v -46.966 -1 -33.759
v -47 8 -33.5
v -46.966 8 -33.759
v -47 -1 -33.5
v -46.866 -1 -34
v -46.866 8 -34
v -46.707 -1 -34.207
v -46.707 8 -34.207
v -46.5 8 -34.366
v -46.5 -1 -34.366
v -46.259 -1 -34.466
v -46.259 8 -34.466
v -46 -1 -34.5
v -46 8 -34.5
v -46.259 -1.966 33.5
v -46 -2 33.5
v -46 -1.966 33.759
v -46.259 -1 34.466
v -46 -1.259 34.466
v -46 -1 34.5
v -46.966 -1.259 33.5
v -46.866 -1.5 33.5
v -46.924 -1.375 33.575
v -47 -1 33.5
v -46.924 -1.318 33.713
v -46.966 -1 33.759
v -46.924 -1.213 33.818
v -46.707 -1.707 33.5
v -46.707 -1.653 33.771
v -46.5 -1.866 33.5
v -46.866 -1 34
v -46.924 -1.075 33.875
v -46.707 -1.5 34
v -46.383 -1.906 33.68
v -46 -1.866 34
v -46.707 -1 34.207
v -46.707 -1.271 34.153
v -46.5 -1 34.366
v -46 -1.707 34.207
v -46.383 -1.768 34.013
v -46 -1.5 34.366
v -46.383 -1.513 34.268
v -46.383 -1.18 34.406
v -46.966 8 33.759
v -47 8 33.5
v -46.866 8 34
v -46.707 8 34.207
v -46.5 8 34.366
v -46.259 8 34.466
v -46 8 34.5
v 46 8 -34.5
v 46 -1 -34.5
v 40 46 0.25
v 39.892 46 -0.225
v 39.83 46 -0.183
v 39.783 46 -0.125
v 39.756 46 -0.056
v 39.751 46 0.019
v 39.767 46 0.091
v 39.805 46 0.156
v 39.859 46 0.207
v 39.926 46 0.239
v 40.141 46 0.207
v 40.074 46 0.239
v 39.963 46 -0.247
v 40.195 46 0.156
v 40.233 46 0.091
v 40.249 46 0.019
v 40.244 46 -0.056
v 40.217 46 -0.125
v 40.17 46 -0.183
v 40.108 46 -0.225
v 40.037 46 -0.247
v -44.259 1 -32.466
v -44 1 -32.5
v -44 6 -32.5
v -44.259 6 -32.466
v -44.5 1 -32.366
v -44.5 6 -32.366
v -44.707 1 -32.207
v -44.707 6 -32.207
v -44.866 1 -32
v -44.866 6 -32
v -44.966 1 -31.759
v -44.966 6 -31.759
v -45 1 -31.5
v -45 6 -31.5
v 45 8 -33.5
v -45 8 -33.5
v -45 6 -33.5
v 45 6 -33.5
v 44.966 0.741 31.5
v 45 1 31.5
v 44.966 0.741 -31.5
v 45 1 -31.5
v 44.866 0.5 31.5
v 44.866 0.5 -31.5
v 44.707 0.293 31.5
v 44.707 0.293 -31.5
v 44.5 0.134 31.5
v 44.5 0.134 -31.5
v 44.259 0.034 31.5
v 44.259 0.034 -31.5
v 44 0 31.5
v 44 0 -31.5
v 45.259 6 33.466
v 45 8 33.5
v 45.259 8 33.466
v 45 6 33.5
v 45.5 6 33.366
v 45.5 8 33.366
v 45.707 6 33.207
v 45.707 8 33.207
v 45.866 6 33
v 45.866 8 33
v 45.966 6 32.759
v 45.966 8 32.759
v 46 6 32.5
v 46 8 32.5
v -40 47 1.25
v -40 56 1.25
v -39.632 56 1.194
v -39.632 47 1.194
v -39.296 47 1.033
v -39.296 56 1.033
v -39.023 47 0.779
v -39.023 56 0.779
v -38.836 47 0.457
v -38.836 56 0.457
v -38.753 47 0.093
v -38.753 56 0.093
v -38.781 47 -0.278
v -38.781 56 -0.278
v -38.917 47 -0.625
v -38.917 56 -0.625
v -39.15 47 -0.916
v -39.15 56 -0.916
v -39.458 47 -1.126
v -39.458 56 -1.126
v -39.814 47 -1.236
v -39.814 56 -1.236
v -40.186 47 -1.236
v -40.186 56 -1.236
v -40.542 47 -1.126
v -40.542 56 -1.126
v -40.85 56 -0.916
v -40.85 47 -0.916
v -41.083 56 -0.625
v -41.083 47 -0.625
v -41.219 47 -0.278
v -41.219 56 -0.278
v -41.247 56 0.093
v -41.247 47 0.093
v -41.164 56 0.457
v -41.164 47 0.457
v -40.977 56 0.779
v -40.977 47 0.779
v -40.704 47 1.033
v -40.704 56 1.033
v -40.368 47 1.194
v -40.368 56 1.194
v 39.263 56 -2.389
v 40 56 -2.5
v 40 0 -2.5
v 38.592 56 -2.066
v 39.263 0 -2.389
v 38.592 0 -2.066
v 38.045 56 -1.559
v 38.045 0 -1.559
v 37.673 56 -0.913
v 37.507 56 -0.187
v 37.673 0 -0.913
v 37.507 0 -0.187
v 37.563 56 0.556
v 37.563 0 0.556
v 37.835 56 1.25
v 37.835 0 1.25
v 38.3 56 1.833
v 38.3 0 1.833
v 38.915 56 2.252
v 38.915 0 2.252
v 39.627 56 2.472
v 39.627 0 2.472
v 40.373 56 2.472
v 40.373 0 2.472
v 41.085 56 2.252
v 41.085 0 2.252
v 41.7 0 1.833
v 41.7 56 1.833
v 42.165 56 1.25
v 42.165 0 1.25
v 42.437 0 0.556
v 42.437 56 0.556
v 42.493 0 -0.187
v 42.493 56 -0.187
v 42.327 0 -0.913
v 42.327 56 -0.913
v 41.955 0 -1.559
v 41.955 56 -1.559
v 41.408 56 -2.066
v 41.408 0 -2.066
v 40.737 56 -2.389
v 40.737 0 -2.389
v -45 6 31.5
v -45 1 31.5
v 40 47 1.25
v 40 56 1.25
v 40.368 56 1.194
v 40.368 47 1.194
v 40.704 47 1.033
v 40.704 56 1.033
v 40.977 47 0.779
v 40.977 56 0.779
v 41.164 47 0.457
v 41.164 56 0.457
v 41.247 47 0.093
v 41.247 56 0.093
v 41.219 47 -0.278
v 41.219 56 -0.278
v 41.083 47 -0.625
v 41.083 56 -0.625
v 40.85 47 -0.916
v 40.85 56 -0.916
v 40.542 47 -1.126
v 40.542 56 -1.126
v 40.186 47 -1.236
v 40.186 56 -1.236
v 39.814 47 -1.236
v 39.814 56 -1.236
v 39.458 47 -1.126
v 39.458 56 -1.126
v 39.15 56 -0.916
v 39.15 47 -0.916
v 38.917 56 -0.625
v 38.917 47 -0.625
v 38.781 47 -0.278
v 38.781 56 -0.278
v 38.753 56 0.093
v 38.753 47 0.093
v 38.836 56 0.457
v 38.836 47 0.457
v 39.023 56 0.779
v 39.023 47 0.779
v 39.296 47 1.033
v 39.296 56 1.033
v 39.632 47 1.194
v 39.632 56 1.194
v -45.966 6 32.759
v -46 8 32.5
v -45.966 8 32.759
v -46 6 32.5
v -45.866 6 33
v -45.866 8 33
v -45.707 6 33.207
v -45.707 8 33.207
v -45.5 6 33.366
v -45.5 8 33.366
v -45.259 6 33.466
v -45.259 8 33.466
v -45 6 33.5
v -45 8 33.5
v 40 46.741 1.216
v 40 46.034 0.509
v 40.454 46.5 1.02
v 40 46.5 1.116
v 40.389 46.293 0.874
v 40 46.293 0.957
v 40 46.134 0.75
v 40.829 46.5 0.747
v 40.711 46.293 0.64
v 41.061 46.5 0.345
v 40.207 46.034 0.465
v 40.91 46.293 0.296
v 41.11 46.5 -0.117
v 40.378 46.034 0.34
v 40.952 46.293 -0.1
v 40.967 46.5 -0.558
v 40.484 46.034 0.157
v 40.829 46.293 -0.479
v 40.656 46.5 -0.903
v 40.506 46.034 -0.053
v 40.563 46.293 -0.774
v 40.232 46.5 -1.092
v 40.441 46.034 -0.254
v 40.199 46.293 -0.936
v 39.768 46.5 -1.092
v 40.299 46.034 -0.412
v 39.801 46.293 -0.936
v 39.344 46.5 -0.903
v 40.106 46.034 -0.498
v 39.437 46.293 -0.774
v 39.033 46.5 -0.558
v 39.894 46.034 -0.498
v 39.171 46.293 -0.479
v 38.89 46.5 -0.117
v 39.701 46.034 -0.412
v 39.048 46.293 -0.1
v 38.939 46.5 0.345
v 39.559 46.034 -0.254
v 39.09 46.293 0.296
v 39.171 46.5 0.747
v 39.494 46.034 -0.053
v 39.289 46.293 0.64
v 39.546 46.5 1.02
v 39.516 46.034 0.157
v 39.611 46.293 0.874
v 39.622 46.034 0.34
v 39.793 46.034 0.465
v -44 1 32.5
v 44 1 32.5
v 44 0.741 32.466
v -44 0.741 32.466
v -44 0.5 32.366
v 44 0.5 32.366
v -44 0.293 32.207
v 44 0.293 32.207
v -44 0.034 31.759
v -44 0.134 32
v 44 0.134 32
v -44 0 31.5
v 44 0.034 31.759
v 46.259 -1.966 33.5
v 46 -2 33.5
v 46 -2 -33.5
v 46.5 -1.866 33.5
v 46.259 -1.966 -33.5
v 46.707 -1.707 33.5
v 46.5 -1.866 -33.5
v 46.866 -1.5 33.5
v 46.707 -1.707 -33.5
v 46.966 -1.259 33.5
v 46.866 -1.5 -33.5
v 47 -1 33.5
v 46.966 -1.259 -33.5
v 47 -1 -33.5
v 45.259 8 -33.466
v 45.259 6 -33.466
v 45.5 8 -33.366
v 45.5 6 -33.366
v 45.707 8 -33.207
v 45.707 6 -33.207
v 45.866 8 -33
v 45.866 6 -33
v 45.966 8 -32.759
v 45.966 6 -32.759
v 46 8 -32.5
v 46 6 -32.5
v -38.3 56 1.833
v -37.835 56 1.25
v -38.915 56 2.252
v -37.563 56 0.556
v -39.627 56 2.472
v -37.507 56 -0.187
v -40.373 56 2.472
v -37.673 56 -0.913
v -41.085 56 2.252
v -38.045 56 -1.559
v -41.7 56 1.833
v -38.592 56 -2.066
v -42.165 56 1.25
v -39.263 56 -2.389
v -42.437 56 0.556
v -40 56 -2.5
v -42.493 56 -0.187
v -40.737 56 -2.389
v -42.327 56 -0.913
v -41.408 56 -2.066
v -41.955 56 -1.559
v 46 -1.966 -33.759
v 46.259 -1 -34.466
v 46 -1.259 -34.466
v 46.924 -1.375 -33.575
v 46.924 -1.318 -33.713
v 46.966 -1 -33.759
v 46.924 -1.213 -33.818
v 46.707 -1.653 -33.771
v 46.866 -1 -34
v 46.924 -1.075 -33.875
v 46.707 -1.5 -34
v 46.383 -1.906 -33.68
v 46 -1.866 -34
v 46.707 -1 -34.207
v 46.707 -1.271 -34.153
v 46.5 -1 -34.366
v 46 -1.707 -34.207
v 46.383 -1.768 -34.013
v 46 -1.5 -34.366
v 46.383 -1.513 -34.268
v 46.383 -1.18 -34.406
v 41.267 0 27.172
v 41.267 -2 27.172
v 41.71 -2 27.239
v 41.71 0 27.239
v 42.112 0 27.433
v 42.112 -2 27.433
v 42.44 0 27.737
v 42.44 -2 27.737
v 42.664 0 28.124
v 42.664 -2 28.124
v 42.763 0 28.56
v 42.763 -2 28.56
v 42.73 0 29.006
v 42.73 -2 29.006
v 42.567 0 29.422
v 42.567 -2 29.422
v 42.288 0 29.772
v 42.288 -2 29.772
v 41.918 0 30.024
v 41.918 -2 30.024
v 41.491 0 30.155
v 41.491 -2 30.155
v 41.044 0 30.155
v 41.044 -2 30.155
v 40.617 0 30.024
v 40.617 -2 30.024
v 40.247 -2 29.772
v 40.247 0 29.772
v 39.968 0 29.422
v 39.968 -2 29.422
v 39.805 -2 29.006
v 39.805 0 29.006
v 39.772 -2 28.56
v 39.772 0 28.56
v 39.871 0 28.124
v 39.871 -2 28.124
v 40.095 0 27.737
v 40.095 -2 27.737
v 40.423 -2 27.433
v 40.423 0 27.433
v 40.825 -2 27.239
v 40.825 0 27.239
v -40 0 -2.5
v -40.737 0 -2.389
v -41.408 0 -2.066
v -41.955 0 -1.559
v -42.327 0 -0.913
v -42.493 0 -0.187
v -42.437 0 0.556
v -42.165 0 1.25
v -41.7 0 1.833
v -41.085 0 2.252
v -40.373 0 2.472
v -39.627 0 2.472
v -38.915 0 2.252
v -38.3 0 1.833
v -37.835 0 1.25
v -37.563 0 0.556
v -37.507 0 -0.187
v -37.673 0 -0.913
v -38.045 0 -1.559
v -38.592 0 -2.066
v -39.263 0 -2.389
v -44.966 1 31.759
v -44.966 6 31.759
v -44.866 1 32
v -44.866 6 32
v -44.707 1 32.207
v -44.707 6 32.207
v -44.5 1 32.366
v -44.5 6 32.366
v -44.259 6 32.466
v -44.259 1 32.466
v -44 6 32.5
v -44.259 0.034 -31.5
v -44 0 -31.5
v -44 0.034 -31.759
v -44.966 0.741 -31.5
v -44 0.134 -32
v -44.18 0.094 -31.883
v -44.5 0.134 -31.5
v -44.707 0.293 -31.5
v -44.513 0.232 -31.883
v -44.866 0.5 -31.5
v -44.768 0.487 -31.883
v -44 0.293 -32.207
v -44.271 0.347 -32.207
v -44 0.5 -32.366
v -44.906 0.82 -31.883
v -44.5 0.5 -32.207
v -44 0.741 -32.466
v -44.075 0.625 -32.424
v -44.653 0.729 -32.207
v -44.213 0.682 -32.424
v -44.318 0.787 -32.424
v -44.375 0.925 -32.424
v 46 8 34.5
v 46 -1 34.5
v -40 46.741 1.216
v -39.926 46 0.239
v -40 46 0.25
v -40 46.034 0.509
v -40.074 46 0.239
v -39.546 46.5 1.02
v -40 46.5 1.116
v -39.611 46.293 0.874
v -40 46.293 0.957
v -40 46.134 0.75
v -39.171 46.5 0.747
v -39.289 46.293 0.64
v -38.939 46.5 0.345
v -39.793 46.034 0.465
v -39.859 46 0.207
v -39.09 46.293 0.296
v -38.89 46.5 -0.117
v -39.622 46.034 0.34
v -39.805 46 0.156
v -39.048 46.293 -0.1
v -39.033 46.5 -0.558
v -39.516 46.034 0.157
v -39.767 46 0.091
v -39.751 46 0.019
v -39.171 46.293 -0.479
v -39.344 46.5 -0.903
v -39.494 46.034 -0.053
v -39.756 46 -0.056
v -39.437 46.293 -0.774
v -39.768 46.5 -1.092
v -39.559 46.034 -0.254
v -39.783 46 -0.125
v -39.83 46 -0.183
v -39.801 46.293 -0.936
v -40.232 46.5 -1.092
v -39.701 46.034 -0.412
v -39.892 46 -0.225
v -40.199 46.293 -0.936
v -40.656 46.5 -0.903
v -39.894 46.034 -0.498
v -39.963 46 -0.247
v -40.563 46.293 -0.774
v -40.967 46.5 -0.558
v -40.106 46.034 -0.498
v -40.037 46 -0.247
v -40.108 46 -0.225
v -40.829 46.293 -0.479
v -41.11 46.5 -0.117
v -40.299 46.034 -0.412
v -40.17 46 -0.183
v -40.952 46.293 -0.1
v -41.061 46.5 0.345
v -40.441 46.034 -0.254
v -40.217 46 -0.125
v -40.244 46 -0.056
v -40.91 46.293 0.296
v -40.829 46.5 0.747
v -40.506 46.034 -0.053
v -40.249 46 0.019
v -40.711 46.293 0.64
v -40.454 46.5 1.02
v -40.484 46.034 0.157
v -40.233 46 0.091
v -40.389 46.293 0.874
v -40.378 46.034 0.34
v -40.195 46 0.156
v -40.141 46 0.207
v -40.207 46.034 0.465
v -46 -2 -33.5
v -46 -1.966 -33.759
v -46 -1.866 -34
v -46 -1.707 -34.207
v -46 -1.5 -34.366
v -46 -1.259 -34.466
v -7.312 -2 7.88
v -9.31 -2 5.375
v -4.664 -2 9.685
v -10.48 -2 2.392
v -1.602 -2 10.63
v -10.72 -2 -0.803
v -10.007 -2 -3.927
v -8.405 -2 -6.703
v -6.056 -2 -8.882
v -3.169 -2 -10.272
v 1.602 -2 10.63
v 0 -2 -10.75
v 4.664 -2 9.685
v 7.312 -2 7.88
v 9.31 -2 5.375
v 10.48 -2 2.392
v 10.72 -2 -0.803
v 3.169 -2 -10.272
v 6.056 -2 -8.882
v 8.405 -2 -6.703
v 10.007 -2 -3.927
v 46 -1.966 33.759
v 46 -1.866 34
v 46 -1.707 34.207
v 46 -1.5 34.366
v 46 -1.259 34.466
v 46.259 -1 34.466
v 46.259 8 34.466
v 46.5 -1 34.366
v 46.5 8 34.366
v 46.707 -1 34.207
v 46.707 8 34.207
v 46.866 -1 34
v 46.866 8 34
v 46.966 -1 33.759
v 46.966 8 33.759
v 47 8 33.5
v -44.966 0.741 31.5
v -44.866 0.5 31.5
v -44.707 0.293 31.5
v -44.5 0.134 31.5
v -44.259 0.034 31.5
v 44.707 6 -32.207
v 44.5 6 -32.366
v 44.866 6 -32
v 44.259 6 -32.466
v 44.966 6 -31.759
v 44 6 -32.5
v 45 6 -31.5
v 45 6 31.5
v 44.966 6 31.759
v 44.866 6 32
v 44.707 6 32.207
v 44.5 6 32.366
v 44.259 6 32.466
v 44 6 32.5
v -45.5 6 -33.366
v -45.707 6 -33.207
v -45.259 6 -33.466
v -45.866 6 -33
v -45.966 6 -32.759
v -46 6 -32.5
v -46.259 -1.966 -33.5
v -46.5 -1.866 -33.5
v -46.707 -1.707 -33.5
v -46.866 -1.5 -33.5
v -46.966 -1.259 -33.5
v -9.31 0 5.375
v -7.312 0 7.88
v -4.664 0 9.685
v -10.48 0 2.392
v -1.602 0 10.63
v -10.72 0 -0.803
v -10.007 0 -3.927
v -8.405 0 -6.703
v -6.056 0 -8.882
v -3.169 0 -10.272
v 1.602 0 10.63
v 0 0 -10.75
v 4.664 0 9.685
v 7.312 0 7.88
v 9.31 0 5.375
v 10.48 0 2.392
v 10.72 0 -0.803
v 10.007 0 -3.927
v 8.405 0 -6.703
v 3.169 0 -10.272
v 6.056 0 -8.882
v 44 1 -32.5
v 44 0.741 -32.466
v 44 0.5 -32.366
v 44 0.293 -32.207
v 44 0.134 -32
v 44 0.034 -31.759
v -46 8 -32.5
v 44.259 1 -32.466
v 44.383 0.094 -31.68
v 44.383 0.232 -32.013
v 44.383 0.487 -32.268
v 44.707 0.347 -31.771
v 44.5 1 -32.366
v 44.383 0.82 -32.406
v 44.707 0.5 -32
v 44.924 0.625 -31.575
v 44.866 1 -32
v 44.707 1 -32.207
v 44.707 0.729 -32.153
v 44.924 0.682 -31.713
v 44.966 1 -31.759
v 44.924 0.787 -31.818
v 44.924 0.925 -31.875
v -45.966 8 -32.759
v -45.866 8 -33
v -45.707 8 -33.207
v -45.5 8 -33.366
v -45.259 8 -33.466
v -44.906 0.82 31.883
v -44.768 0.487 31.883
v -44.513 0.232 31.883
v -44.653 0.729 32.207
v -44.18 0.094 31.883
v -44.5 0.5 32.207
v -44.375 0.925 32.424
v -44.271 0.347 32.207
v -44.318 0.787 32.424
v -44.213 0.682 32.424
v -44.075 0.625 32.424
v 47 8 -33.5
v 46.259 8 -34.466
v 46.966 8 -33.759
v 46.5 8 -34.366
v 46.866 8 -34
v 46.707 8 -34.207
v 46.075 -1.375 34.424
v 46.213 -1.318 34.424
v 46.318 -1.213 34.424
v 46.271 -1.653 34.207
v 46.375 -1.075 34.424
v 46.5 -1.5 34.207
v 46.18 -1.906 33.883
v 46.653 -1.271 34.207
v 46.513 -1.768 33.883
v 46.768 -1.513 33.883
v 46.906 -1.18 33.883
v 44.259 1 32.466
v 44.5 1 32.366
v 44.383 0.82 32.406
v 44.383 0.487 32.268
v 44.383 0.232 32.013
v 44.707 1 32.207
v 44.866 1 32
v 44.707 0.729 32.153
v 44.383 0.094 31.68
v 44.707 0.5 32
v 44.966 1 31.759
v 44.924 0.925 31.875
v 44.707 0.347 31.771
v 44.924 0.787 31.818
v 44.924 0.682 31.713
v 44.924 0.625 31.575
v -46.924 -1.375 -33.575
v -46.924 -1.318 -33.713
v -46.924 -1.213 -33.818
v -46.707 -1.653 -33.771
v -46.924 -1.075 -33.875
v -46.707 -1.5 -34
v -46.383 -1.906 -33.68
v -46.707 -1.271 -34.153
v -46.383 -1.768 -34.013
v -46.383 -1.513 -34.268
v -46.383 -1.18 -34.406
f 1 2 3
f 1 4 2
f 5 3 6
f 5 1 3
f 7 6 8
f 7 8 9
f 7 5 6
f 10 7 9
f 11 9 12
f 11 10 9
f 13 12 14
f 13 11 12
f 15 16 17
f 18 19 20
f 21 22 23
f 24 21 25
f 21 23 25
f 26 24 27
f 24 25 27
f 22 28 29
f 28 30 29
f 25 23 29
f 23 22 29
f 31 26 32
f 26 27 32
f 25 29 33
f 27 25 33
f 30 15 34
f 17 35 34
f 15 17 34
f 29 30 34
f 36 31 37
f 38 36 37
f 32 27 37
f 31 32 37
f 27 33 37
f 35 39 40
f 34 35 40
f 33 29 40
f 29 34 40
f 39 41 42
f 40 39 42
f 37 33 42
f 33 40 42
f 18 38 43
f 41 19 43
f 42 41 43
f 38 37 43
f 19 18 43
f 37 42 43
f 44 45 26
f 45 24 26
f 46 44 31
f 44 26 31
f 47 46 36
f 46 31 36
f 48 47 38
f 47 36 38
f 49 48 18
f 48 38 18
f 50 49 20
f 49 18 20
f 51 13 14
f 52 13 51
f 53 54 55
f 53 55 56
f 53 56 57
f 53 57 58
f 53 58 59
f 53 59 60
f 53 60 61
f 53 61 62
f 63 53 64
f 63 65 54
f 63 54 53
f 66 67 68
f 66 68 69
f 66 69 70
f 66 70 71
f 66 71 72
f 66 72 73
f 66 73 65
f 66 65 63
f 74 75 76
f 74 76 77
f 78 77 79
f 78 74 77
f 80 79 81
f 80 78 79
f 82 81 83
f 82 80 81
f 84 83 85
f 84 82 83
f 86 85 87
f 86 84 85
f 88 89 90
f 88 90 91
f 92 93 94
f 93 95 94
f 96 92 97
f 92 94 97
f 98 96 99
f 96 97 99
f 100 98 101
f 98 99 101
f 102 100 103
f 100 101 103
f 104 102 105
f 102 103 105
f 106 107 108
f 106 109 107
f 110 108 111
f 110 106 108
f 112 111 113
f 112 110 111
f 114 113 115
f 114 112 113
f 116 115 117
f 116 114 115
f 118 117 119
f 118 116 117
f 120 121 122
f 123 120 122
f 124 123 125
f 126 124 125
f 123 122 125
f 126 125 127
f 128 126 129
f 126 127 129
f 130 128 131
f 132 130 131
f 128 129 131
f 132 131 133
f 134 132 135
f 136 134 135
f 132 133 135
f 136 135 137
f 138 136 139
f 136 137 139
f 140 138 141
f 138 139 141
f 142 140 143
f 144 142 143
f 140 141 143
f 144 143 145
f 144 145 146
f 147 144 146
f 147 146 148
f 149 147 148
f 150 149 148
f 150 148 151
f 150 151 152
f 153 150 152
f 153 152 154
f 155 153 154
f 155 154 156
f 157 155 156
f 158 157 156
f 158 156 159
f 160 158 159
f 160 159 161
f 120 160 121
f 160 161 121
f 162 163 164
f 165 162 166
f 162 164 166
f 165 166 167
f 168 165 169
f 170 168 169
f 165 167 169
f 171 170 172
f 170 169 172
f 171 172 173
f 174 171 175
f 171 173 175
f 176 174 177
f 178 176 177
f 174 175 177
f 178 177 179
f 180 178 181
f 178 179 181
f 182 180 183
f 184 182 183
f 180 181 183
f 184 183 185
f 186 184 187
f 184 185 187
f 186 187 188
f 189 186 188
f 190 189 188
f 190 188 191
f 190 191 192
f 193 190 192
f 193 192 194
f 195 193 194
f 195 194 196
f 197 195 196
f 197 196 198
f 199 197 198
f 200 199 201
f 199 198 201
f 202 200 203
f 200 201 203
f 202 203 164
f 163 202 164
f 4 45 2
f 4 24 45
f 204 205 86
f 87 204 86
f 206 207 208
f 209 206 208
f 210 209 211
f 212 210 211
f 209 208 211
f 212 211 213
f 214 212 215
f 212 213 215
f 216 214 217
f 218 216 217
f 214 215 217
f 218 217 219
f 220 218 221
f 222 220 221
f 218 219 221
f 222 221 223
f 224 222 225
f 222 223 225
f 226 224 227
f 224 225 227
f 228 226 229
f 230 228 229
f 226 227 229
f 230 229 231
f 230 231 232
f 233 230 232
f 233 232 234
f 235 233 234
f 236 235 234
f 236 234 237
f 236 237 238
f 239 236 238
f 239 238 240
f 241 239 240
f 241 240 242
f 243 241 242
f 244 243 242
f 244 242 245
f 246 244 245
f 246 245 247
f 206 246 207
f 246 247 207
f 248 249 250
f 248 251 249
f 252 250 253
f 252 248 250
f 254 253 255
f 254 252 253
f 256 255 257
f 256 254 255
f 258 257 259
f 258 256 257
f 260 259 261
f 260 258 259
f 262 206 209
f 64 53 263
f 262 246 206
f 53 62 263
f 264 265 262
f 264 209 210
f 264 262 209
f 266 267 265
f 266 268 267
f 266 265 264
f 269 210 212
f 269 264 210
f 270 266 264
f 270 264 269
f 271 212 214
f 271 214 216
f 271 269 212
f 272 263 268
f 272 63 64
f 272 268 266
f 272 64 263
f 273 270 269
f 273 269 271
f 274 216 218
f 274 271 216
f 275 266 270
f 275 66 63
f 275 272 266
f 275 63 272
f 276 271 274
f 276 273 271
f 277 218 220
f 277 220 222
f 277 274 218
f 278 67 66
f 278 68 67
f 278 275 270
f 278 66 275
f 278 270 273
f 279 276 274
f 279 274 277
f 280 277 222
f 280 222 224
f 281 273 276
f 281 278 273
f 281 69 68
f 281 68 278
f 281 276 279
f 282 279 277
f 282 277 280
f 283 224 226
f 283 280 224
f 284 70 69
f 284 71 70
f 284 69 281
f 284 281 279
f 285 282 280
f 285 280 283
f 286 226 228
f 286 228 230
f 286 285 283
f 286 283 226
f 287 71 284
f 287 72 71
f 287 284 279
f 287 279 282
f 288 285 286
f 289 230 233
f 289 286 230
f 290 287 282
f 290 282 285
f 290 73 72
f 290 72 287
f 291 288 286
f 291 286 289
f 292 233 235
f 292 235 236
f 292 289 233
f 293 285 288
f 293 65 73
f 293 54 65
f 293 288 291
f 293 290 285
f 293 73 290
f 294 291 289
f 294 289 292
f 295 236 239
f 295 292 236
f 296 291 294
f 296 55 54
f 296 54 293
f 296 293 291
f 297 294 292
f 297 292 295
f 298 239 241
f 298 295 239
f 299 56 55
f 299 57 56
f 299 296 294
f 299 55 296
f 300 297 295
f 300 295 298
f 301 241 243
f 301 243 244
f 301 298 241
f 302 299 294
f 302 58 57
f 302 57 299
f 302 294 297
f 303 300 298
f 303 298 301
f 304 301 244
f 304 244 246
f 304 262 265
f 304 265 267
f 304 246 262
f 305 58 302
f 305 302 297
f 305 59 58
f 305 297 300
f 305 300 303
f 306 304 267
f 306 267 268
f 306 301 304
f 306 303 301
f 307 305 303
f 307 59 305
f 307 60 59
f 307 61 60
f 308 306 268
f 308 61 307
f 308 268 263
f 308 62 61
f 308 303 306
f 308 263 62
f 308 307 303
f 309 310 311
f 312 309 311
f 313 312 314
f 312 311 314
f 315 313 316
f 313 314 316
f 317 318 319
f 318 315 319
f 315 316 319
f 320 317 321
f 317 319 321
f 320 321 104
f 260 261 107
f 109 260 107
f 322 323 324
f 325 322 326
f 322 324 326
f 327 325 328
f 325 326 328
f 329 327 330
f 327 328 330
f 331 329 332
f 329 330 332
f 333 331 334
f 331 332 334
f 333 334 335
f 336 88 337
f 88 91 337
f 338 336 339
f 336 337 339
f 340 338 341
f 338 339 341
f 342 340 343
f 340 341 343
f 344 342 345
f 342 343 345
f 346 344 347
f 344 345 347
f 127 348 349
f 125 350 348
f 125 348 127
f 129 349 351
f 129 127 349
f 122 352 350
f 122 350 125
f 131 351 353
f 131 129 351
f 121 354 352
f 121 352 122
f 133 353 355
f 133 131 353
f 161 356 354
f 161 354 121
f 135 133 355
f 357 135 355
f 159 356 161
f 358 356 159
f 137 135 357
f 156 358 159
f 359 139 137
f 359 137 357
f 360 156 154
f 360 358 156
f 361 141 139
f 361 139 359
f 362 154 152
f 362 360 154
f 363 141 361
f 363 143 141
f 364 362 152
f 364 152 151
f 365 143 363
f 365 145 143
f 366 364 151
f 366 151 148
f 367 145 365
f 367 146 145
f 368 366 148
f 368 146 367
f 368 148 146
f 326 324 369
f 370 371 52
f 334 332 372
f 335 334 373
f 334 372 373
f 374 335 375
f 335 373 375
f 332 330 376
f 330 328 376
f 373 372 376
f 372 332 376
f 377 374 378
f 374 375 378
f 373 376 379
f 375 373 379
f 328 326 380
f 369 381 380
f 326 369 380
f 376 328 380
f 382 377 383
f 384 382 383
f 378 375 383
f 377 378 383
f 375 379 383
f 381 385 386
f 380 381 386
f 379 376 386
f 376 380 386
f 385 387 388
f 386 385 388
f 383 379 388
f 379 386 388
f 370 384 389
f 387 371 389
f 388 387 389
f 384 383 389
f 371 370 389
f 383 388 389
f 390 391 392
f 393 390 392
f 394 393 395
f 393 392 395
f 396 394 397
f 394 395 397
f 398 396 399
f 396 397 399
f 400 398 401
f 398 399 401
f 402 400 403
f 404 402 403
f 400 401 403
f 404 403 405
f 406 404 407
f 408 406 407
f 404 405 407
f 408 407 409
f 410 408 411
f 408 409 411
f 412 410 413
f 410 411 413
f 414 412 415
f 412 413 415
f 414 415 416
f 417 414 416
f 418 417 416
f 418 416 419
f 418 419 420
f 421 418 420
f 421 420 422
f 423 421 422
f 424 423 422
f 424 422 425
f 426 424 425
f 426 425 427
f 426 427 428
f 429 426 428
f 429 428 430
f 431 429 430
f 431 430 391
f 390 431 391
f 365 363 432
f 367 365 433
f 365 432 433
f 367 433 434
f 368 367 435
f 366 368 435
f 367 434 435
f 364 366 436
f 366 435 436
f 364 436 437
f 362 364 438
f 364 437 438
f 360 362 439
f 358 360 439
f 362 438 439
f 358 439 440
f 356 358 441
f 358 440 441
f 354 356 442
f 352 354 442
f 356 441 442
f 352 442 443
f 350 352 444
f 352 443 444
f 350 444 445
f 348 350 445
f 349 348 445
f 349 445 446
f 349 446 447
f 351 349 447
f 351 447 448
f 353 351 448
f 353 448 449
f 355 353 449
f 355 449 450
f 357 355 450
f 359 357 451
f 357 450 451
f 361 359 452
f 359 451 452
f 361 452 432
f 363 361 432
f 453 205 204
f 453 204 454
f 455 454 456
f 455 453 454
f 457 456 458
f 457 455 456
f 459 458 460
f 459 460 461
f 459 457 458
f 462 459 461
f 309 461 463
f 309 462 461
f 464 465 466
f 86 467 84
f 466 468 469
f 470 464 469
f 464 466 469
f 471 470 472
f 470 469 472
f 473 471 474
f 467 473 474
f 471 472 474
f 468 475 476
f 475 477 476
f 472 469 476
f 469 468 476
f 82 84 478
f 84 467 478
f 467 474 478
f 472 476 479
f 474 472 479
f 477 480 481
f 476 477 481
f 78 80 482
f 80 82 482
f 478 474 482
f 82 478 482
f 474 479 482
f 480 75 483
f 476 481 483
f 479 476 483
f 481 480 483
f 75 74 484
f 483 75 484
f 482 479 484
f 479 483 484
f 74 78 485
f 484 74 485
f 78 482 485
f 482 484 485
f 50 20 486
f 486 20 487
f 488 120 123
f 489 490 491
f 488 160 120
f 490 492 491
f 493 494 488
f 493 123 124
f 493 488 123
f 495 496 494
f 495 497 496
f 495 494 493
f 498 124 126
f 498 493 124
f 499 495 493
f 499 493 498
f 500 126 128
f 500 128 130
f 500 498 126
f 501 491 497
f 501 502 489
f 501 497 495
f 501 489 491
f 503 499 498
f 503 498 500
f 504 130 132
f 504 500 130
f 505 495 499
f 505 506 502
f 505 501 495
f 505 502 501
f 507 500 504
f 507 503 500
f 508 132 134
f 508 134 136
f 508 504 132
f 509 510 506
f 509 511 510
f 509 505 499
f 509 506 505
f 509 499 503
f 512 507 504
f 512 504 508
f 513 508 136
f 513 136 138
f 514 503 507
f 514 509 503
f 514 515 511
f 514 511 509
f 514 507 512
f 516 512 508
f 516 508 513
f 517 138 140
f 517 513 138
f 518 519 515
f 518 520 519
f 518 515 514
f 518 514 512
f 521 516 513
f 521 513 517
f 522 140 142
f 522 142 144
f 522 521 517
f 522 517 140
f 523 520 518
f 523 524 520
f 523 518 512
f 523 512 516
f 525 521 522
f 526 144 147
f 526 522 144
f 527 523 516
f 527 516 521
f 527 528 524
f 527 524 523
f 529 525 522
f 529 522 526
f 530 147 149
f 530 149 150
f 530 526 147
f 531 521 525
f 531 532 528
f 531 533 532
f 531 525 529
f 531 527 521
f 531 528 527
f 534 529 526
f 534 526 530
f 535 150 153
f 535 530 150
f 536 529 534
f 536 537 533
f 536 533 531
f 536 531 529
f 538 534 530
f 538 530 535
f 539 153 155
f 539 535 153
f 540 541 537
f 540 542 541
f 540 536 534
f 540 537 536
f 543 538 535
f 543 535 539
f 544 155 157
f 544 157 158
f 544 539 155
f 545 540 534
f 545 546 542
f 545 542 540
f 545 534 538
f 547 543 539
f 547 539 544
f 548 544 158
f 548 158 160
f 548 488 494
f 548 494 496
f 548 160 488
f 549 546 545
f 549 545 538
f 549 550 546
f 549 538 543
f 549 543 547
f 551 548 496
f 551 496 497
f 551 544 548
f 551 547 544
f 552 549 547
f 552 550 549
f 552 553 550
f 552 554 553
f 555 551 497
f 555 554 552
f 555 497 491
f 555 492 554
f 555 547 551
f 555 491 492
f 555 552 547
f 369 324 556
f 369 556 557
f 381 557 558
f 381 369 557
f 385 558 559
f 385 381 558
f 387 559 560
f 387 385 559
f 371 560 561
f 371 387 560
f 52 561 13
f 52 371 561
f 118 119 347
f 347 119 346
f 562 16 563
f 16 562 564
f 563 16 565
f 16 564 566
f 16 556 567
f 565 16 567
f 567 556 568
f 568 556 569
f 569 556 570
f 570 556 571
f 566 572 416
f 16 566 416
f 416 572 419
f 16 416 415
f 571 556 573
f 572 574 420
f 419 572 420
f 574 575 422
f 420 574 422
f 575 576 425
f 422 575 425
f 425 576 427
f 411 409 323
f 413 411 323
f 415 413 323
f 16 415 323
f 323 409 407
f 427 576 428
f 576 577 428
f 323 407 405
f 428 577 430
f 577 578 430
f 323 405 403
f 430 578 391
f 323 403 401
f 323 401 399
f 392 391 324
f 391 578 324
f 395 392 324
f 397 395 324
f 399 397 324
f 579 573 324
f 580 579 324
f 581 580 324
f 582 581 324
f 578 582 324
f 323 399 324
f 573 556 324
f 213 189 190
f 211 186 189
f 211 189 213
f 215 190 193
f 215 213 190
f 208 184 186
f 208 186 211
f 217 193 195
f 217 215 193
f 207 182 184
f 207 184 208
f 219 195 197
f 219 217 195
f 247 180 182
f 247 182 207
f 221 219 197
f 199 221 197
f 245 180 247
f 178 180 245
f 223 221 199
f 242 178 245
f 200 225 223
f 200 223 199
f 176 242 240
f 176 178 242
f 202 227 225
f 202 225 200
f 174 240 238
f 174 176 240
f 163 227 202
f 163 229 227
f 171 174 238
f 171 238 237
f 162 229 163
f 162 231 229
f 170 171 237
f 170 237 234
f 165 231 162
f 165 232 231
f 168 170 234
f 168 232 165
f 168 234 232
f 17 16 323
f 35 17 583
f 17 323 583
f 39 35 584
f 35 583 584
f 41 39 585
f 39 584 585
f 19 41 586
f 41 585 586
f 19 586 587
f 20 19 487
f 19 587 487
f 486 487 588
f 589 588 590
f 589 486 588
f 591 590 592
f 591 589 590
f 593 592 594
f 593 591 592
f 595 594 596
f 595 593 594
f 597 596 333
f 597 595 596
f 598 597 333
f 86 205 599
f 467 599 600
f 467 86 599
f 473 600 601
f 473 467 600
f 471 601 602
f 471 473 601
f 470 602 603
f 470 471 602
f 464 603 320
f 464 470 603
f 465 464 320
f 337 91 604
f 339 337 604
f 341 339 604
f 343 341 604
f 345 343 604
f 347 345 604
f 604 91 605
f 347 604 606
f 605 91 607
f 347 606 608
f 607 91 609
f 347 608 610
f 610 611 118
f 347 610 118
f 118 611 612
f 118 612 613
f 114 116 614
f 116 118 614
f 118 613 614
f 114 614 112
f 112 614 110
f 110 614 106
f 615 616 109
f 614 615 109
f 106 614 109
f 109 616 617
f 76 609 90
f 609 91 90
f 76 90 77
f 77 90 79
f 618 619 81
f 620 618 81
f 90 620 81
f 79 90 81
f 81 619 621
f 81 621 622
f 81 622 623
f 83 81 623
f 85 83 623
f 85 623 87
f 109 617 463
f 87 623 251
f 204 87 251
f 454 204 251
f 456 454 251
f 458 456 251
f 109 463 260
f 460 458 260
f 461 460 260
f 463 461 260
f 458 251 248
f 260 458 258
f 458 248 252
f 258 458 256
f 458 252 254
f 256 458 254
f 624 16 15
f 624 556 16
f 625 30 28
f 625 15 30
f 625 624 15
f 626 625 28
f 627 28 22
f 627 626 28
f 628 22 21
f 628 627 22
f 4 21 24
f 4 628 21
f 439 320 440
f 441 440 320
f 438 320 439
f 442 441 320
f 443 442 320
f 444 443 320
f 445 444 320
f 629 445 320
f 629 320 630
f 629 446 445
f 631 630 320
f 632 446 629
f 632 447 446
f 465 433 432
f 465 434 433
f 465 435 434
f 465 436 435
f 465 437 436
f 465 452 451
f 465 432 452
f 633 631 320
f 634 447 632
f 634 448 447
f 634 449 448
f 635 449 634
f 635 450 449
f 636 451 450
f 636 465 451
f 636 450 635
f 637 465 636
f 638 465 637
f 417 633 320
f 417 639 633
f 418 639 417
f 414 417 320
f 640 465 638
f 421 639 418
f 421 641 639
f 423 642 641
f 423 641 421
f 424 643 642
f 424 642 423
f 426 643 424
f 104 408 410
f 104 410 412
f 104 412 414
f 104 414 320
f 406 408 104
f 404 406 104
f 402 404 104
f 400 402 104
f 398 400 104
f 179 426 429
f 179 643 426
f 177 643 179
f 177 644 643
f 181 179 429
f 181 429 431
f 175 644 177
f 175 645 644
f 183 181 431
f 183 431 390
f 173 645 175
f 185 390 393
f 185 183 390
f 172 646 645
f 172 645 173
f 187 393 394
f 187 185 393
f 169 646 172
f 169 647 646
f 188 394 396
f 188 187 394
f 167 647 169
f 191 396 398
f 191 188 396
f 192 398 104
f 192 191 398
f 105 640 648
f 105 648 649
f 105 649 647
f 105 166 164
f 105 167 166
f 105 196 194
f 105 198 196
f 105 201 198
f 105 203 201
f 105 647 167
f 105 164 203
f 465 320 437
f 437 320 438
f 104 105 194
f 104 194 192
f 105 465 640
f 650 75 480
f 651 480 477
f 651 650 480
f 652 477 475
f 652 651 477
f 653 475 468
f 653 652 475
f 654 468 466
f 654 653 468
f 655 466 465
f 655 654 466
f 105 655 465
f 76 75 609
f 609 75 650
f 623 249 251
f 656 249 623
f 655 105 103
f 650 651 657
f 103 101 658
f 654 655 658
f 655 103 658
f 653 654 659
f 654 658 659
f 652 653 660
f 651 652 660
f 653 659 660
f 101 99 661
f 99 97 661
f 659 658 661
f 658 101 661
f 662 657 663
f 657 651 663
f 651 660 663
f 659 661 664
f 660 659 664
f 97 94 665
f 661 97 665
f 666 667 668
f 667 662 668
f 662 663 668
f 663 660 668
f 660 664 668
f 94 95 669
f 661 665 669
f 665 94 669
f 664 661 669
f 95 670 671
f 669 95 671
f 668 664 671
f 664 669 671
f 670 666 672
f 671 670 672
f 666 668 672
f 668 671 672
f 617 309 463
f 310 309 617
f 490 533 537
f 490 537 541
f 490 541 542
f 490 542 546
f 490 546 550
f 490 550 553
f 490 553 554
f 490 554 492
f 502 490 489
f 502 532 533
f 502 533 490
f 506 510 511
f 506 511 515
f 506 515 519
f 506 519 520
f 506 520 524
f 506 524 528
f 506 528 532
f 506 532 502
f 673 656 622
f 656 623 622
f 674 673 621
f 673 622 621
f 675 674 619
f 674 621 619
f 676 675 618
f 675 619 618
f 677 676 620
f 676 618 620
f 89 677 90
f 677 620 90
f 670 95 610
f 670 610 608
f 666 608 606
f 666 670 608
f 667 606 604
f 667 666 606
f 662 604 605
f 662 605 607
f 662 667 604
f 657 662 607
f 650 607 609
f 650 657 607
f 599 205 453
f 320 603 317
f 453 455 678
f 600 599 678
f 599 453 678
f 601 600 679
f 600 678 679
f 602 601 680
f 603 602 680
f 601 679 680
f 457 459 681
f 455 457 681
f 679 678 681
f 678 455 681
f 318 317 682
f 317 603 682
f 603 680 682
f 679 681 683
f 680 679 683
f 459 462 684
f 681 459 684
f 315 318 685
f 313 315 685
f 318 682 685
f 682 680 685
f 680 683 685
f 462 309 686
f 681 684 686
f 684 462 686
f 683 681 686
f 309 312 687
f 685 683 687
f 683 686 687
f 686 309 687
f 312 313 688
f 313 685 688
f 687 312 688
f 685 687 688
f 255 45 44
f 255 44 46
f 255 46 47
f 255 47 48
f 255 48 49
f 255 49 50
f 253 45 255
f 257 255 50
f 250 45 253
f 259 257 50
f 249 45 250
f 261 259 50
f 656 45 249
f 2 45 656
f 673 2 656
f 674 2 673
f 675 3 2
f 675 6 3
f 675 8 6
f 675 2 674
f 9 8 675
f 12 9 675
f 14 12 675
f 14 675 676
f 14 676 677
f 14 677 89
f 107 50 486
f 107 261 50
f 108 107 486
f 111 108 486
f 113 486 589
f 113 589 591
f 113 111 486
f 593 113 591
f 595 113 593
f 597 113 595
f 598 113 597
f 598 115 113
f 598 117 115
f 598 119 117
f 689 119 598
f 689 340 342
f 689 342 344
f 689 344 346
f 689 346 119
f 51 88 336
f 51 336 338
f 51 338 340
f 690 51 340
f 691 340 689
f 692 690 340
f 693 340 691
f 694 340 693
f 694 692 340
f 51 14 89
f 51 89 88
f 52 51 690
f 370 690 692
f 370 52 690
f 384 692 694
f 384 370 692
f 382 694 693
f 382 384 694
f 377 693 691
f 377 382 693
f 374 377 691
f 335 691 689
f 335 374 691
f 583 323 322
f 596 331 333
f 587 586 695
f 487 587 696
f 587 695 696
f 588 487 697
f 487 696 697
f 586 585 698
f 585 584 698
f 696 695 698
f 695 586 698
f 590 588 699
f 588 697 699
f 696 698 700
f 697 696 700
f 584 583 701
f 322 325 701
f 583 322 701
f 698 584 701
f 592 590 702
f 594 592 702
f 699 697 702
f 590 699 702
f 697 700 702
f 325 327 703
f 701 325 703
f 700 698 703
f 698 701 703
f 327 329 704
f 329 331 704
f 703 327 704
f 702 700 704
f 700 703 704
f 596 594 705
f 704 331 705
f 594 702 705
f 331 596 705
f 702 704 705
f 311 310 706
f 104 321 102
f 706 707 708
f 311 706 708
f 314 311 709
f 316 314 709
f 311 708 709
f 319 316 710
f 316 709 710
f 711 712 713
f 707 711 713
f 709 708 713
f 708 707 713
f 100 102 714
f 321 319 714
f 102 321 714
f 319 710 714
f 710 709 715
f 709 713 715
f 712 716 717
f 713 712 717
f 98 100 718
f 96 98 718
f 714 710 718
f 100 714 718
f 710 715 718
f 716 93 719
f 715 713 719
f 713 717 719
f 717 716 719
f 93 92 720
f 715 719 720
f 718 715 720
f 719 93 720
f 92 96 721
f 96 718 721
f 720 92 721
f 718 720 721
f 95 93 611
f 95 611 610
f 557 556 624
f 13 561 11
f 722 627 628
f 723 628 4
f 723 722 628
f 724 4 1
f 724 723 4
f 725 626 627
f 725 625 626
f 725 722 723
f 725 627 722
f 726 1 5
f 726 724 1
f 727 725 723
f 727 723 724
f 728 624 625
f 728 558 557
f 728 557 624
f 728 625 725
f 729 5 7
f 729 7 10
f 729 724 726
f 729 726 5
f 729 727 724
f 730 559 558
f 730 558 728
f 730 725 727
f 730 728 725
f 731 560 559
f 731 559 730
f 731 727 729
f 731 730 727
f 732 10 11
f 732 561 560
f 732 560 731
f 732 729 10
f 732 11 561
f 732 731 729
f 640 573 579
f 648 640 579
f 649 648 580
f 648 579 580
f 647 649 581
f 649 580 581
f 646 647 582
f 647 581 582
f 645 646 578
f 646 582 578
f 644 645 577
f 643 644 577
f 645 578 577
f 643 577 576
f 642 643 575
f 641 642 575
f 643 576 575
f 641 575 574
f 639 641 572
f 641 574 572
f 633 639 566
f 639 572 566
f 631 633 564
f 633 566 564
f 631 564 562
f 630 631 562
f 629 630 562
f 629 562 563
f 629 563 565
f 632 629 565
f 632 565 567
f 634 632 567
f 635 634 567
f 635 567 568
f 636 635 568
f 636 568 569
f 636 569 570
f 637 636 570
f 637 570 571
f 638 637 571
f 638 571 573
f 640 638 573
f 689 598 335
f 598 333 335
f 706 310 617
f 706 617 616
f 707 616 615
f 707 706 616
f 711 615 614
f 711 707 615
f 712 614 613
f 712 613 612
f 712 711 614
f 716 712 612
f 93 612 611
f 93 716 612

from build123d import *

# Parameters (mm, degrees)
SKETCH1_W           = 90
SKETCH1_H           = 65
BOSS_EXTRUDE1_DEPTH = 8
SHELL1_T            = 2
SKETCH3_W           = 92
SKETCH3_H           = 67
SKETCH3_W_2         = 90
SKETCH3_H_2         = 65
CUT_EXTRUDE1_DEPTH  = 2
FILLET2_R           = 1
FILLET3_R           = 1
FILLET4_R           = 1
SKETCH2_R           = 2.5
BOSS_EXTRUDE2_DEPTH = 56
SKETCH4_R           = 1.25
CUT_EXTRUDE2_DEPTH  = 10
FILLET5_R           = 1
SKETCH5_R           = 10.75
CUT_EXTRUDE3_DEPTH  = 10
SKETCH6_R           = 1.5
CUT_EXTRUDE4_DEPTH  = 10
FILLET6_R           = 1


with BuildPart() as part:
    # Sketch1 → Boss-Extrude1 (new body)
    with BuildSketch(Plane(origin=(0, 0, 0), x_dir=(1, 0, 0), z_dir=(0, 1, 0))):
        Rectangle(SKETCH1_W, SKETCH1_H)
    extrude(amount=BOSS_EXTRUDE1_DEPTH)

    # Shell1
    shell1_openings = [part.faces().sort_by_distance(p)[0] for p in [
        (0, 8, 0),
    ]]
    offset(amount=SHELL1_T, openings=shell1_openings, kind=Kind.INTERSECTION)

    # Sketch3 → Cut-Extrude1 (cut)
    with BuildSketch(Plane(origin=(0, 8, 0), x_dir=(1, 0, 0), z_dir=(0, 1, 0))):
        Rectangle(SKETCH3_W, SKETCH3_H)
        Rectangle(SKETCH3_W_2, SKETCH3_H_2, mode=Mode.SUBTRACT)
    extrude(amount=-CUT_EXTRUDE1_DEPTH, mode=Mode.SUBTRACT)

    # Fillet2
    fillet2_edges = [part.edges().sort_by_distance(p)[0] for p in [
        (46, 7, -33.5),
        (46, 7, 33.5),
        (-46, 7, 33.5),
        (-46, 7, -33.5),
    ]]
    fillet(fillet2_edges, radius=FILLET2_R)

    # Fillet3
    fillet3_edges = [part.edges().sort_by_distance(p)[0] for p in [
        (-45, 0, 0),
        (0, 0, 32.5),
        (45, 0, 0),
        (0, 0, -32.5),
    ]]
    fillet(fillet3_edges, radius=FILLET3_R)

    # Fillet4
    # the kernel refuses this fillet: 1 mm, written as the material it adds along each edge
    with BuildSketch(Plane(origin=(44, 1, 31.5), x_dir=(0, 0, 1), z_dir=(1, 0, 0))) as fillet4_piece_1_section:
        Polygon((0, 0), (FILLET4_R, 0), (FILLET4_R, FILLET4_R), (0, FILLET4_R), align=None)
    fillet4_piece_1 = extrude(amount=FILLET4_R, mode=Mode.PRIVATE)
    fillet4_piece_1 = fillet4_piece_1 - Plane(origin=(44, 1, 31.5), x_dir=(0, 0.7071067811865475, -0.7071067811865475), z_dir=(1, 0, 0)) * Sphere(FILLET4_R, mode=Mode.PRIVATE)
    add(fillet4_piece_1)
    with BuildSketch(Plane(origin=(-44, 1, 31.5), x_dir=(-1, 0, 0), z_dir=(0, 0, 1))) as fillet4_piece_2_section:
        Polygon((0, 0), (FILLET4_R, 0), (FILLET4_R, FILLET4_R), (0, FILLET4_R), align=None)
    fillet4_piece_2 = extrude(amount=FILLET4_R, mode=Mode.PRIVATE)
    fillet4_piece_2 = fillet4_piece_2 - Plane(origin=(-44, 1, 31.5), x_dir=(0.7071067811865475, 0.7071067811865475, 0), z_dir=(0, 0, 1)) * Sphere(FILLET4_R, mode=Mode.PRIVATE)
    add(fillet4_piece_2)
    with BuildSketch(Plane(origin=(44, 1, -31.5), x_dir=(0, 0, -1), z_dir=(1, 0, 0))) as fillet4_piece_3_section:
        Polygon((0, 0), (FILLET4_R, 0), (FILLET4_R, -FILLET4_R), (0, -FILLET4_R), align=None)
    fillet4_piece_3 = extrude(amount=FILLET4_R, mode=Mode.PRIVATE)
    fillet4_piece_3 = fillet4_piece_3 - Plane(origin=(44, 1, -31.5), x_dir=(0, 0.7071067811865475, 0.7071067811865475), z_dir=(1, 0, 0)) * Sphere(FILLET4_R, mode=Mode.PRIVATE)
    add(fillet4_piece_3)
    with BuildSketch(Plane(origin=(-44, 1, -31.5), x_dir=(-1, 0, 0), z_dir=(0, 0, -1))) as fillet4_piece_4_section:
        Polygon((0, 0), (FILLET4_R, 0), (FILLET4_R, -FILLET4_R), (0, -FILLET4_R), align=None)
    fillet4_piece_4 = extrude(amount=FILLET4_R, mode=Mode.PRIVATE)
    fillet4_piece_4 = fillet4_piece_4 - Plane(origin=(-44, 1, -31.5), x_dir=(0.7071067811865475, 0.7071067811865475, 0), z_dir=(0, 0, -1)) * Sphere(FILLET4_R, mode=Mode.PRIVATE)
    add(fillet4_piece_4)
    with BuildSketch(Plane(origin=(45, 1, -32.5), x_dir=(0, 0, 1), z_dir=(0, 1, 0)), Plane(origin=(-45, 1, -32.5), x_dir=(1, 0, 0), z_dir=(0, 1, 0))) as fillet4_piece_5:
        with BuildLine():
            CenterArc((FILLET4_R, -FILLET4_R), FILLET4_R, 90, 90)
            Line((0, -FILLET4_R), (0, 0))
            Line((0, 0), (FILLET4_R, 0))
        make_face()
    extrude(amount=5)
    with BuildSketch(Plane(origin=(45, 1, 32.5), x_dir=(0, 0, -1), z_dir=(0, 1, 0)), Plane(origin=(-45, 1, 32.5), x_dir=(1, 0, 0), z_dir=(0, 1, 0))) as fillet4_piece_6:
        with BuildLine():
            CenterArc((FILLET4_R, FILLET4_R), FILLET4_R, 180, 90)
            Line((0, FILLET4_R), (0, 0))
            Line((0, 0), (FILLET4_R, 0))
        make_face()
    extrude(amount=5)

    # Sketch2 → Boss-Extrude2 (add)
    with BuildSketch(Plane(origin=(0, 0, 0), x_dir=(1, 0, 0), z_dir=(0, 1, 0))):
        with Locations(Location((-40, 0, 0), (0, 0, 90))):
            Circle(SKETCH2_R)
        with Locations(Location((40, 0, 0), (0, 0, 90))):
            Circle(SKETCH2_R)
    extrude(amount=BOSS_EXTRUDE2_DEPTH)

    # Sketch4 → Cut-Extrude2 (cut)
    with BuildSketch(Plane(origin=(0, 56, 0), x_dir=(1, 0, 0), z_dir=(0, 1, 0))):
        with Locations(Location((40, 0, 0), (0, 0, 270))):
            Circle(SKETCH4_R)
        with Locations(Location((-40, 0, 0), (0, 0, 270))):
            Circle(SKETCH4_R)
    extrude(amount=-CUT_EXTRUDE2_DEPTH, mode=Mode.SUBTRACT)

    # Fillet5
    fillet5_edges = [part.edges().sort_by_distance(p)[0] for p in [
        (40, 46, -1.25),
        (-40, 46, -1.25),
    ]]
    fillet(fillet5_edges, radius=FILLET5_R)

    # Sketch5 → Cut-Extrude3 (cut)
    with BuildSketch(Plane(origin=(0, -2, 0), x_dir=(-1, 0, 0), z_dir=(0, -1, 0))):
        with Locations(Location((0, 0, 0), (0, 0, 90))):
            Circle(SKETCH5_R)
    extrude(amount=-CUT_EXTRUDE3_DEPTH, mode=Mode.SUBTRACT)

    # Sketch6 → Cut-Extrude4 (cut)
    with BuildSketch(Plane(origin=(0, -2, 0), x_dir=(-1, 0, 0), z_dir=(0, -1, 0))):
        with Locations(Location((-41.26748628, -28.672065144, 0), (0, 0, 90))):
            Circle(SKETCH6_R)
    extrude(amount=-CUT_EXTRUDE4_DEPTH, mode=Mode.SUBTRACT)

    # Fillet6
    fillet6_edges = [part.edges().sort_by_distance(p)[0] for p in [
        (0, -2, -34.5),
        (47, -2, 0),
        (0, -2, 34.5),
        (-47, -2, 0),
        (-47, 3, -34.5),
        (47, 3, -34.5),
        (47, 3, 34.5),
        (-47, 3, 34.5),
    ]]
    fillet(fillet6_edges, radius=FILLET6_R)


solid = part.part
